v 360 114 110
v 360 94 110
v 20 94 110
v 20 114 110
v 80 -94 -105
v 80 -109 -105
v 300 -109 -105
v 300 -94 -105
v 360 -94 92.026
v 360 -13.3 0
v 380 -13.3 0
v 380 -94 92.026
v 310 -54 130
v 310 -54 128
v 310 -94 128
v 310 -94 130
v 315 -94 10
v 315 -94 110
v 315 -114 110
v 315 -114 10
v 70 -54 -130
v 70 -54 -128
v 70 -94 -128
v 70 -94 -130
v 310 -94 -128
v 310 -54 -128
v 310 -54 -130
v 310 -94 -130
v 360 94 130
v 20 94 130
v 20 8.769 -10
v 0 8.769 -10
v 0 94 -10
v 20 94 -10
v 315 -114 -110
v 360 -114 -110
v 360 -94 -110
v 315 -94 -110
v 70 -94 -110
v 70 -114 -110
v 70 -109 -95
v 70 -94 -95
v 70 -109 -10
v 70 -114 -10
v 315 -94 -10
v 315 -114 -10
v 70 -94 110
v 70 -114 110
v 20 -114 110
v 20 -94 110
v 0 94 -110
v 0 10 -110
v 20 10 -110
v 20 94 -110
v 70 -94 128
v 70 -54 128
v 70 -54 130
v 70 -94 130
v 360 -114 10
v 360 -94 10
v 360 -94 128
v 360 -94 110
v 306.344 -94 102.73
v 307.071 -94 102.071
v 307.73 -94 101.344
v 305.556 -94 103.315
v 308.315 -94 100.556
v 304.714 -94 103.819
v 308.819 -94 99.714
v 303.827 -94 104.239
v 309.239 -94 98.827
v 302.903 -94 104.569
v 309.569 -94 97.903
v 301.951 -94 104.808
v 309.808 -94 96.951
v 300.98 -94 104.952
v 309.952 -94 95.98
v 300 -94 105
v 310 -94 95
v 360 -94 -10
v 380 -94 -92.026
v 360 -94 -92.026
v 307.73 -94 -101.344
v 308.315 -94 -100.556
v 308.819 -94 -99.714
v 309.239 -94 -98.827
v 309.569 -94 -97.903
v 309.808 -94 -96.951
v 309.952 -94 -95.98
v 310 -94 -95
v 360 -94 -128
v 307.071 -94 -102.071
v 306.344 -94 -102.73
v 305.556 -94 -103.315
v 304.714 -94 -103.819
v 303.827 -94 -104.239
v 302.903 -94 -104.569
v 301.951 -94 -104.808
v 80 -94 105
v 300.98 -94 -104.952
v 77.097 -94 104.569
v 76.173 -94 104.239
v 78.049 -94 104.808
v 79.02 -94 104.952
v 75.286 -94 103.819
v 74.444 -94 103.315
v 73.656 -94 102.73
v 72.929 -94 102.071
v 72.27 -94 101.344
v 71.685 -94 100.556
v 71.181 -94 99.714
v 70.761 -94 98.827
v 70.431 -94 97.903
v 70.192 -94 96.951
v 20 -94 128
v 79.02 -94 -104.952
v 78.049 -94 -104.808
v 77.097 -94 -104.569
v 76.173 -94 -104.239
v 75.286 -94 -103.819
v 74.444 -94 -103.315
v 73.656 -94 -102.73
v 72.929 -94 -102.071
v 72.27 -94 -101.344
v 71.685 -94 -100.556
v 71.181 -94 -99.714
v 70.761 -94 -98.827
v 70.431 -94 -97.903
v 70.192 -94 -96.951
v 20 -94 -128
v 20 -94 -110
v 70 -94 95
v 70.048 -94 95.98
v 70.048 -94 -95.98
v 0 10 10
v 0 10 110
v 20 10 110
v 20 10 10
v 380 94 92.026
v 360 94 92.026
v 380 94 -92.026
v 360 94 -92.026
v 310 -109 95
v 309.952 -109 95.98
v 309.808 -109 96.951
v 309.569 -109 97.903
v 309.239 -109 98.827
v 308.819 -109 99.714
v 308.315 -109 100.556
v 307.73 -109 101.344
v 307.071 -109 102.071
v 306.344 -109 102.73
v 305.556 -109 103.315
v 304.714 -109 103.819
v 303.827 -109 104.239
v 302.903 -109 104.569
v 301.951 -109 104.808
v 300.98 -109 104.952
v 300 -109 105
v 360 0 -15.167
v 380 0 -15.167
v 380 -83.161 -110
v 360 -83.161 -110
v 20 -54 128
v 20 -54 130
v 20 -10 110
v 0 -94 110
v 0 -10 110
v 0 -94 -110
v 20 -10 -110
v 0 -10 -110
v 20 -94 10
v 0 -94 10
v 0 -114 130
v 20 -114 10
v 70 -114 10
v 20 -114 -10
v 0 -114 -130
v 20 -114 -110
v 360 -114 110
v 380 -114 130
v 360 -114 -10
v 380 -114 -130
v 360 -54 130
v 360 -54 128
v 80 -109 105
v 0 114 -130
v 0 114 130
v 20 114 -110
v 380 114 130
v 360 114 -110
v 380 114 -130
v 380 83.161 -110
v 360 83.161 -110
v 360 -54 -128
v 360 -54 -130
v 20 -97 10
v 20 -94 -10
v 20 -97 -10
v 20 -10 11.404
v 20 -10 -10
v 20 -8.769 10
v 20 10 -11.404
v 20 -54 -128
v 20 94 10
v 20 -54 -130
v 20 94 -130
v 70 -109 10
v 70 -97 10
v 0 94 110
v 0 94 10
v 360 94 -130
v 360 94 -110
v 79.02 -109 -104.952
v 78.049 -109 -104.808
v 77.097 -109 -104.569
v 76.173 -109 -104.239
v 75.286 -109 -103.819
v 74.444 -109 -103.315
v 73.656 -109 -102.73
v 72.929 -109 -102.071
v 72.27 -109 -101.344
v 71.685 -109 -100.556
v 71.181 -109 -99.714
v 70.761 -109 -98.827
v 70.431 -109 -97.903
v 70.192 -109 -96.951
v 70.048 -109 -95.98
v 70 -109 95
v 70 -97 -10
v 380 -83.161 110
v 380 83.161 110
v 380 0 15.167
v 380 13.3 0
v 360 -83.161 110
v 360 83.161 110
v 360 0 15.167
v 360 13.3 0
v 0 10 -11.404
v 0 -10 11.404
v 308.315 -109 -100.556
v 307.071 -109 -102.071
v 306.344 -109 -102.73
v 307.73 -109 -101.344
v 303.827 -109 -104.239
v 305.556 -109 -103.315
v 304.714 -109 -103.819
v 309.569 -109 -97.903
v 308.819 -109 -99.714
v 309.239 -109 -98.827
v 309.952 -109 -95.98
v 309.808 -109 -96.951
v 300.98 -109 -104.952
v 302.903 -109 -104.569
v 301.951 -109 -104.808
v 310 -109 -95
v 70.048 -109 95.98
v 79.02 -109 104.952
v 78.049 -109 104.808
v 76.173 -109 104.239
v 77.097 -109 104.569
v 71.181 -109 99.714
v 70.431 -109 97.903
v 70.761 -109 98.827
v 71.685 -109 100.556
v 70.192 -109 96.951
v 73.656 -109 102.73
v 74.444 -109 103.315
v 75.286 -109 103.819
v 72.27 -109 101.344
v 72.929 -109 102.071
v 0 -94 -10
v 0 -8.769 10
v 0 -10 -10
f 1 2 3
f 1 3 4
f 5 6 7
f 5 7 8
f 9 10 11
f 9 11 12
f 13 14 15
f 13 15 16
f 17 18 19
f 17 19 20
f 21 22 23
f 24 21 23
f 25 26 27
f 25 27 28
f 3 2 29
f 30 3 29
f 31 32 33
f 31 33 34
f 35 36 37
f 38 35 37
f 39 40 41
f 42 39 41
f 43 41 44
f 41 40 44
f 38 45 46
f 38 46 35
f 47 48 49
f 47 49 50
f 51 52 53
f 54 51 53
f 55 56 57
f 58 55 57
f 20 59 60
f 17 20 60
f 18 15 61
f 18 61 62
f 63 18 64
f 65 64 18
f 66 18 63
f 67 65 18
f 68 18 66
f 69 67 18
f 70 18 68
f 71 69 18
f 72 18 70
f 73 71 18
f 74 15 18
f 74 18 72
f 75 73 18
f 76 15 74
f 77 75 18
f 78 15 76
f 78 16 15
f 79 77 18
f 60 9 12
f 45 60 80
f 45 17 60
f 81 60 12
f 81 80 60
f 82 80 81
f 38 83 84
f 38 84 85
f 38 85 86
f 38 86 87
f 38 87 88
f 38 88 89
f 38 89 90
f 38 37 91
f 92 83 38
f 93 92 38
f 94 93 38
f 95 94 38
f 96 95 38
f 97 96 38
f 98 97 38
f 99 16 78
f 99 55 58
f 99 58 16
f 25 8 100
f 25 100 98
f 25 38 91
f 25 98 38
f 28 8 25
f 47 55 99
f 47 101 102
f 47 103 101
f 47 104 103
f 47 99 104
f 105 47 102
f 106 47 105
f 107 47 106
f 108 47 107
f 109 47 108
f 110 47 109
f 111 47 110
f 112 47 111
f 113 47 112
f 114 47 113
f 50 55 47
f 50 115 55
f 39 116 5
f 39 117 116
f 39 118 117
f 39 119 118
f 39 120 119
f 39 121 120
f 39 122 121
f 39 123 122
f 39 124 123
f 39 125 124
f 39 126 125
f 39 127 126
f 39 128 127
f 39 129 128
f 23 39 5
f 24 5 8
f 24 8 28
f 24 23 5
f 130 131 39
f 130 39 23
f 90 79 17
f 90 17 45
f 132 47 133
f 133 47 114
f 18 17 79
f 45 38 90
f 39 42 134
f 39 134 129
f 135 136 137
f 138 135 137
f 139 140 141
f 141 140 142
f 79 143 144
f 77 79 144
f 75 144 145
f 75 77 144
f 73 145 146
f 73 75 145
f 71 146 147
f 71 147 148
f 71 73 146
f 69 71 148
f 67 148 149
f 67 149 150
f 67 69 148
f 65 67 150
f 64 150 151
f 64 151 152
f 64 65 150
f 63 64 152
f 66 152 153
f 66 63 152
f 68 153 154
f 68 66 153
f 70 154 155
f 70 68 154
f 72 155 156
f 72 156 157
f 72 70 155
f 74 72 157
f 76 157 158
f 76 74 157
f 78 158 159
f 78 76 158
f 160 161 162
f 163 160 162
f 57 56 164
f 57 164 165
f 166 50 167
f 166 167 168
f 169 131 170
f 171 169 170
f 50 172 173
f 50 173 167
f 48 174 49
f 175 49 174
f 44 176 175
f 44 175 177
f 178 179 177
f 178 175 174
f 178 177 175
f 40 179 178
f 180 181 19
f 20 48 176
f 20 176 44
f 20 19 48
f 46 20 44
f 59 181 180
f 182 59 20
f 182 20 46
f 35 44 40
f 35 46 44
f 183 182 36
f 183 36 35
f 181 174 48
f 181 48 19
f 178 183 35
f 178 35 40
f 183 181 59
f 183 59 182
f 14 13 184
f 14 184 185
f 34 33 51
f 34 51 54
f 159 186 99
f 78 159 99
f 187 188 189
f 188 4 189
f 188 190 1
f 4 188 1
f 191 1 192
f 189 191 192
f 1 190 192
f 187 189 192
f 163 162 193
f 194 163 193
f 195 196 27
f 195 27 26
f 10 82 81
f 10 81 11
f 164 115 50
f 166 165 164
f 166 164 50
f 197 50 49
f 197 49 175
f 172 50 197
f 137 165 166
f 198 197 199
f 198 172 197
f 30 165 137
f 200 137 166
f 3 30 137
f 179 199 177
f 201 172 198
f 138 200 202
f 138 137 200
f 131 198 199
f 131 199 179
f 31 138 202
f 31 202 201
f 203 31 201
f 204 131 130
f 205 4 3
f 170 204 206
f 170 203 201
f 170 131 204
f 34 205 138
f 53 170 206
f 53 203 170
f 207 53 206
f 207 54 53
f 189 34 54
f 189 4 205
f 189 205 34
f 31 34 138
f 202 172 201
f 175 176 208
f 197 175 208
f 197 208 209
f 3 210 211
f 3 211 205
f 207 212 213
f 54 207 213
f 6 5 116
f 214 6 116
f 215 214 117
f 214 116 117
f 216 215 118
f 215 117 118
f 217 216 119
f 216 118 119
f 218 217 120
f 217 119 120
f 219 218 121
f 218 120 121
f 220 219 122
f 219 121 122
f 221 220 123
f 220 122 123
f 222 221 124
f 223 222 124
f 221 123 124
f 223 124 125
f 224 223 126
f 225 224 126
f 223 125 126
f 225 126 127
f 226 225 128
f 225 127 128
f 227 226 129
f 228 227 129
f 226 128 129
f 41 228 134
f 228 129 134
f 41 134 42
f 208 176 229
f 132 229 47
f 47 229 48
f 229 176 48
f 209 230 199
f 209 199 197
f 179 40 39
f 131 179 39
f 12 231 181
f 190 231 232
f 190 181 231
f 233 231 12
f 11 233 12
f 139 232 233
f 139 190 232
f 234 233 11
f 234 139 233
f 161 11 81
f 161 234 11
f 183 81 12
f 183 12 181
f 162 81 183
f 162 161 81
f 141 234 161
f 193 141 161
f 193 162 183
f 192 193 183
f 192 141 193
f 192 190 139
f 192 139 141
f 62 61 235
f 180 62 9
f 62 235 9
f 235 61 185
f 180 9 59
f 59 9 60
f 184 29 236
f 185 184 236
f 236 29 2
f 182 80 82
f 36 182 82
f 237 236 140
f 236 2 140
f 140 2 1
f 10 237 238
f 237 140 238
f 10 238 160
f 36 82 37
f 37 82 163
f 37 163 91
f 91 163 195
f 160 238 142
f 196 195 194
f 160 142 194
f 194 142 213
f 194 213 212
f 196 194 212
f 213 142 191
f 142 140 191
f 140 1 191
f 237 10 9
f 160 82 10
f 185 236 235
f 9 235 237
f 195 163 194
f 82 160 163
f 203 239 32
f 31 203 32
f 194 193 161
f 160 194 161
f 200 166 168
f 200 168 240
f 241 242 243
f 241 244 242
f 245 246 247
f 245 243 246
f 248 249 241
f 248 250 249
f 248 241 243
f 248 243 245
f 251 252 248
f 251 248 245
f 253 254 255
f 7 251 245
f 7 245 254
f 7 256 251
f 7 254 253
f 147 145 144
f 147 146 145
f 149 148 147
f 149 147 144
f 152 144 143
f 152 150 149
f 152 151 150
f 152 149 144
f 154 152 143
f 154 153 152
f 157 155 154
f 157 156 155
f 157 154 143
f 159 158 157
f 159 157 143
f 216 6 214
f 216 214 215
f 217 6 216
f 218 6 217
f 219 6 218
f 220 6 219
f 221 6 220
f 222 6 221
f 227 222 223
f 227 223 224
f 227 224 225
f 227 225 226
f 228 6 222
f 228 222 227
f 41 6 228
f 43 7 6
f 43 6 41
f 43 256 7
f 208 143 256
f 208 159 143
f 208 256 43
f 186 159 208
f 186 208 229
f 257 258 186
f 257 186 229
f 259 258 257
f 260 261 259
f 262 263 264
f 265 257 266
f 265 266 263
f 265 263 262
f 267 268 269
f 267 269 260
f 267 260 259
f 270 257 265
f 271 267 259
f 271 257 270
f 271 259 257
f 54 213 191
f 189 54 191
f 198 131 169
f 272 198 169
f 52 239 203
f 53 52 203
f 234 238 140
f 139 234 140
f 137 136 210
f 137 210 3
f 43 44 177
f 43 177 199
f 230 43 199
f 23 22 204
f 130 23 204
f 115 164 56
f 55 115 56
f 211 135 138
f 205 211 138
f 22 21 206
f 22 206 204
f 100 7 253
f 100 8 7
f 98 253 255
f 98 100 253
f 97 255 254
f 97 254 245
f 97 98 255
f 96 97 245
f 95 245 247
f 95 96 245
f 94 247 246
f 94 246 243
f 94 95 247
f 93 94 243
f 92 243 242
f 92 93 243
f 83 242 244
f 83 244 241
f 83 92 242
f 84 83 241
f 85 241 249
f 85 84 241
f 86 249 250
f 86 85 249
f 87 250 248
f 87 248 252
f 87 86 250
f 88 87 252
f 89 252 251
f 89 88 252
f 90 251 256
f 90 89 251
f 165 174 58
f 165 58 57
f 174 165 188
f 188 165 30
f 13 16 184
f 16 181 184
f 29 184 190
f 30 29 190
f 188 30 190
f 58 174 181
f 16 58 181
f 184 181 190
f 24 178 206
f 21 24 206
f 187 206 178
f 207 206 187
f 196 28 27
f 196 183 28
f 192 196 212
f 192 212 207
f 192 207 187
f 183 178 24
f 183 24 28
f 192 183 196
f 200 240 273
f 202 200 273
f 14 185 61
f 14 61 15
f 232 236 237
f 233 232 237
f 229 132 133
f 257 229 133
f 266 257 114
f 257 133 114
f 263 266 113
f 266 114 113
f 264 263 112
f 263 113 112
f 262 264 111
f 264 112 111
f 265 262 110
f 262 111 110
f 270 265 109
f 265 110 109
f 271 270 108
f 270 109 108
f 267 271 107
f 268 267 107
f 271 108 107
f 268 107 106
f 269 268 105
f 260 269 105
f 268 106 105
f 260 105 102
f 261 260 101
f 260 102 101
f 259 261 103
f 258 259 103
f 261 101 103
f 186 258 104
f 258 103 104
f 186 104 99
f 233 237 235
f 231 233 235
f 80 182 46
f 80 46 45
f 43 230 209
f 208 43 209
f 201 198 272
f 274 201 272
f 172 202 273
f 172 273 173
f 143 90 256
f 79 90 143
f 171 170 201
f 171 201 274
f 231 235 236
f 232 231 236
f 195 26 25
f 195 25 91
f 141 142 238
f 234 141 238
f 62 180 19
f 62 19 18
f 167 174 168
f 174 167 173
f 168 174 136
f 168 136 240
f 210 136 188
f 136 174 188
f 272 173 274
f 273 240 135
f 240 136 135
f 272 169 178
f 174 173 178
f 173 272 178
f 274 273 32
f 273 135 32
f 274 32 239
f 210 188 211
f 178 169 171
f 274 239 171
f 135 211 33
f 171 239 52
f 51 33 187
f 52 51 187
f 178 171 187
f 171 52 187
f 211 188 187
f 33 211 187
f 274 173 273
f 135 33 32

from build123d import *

# Parameters (mm, degrees)
SKETCH1_W            = 20
SKETCH1_H            = 260
BOSS_EXTRUDE1_DEPTH  = 10
CUT_EXTRUDE1_DEPTH   = 15
SKETCH3_W            = 10
SKETCH3_H            = 20
BOSS_EXTRUDE2_DEPTH  = 40
BOSS_EXTRUDE3_DEPTH  = 230
BOSS_EXTRUDE4_DEPTH  = 50
SKETCH6_W            = 260
SKETCH6_H            = 228
BOSS_EXTRUDE5_DEPTH  = 20
SKETCH7_W            = 20
SKETCH7_H            = 17
BOSS_EXTRUDE6_DEPTH  = 50
SKETCH8_W            = 20
SKETCH8_H            = 60
BOSS_EXTRUDE7_DEPTH  = 50
SKETCH9_W            = 20
SKETCH9_H            = 60
BOSS_EXTRUDE8_DEPTH  = 50
SKETCH10_W           = 20
SKETCH10_H           = 20
BOSS_EXTRUDE9_DEPTH  = 340
SKETCH11_W           = 20
SKETCH11_H           = 20
BOSS_EXTRUDE10_DEPTH = 340
SKETCH12_W           = 260
SKETCH12_H           = 228
BOSS_EXTRUDE11_DEPTH = 20
SKETCH13_W           = 40
SKETCH13_H           = 20
CUT_EXTRUDE2_DEPTH   = 240
SKETCH14_W           = 210
SKETCH14_H           = 15
CUT_EXTRUDE3_DEPTH   = 230
SKETCH15_W           = 100
SKETCH15_H           = 20
CUT_EXTRUDE4_DEPTH   = 45
SKETCH16_W           = 20
SKETCH16_H           = 100
CUT_EXTRUDE5_DEPTH   = 84
SKETCH17_W           = 20
SKETCH17_H           = 100
CUT_EXTRUDE6_DEPTH   = 84
SKETCH18_W           = 20
SKETCH18_H           = 84
CUT_EXTRUDE7_DEPTH   = 100
SKETCH19_W           = 100
SKETCH19_H           = 20
CUT_EXTRUDE8_DEPTH   = 45
CUT_EXTRUDE9_REACH   = 475.244
SKETCH20_W           = 50
SKETCH20_H           = 40
SKETCH21_W           = 50
SKETCH21_H           = 40
CUT_EXTRUDE10_DEPTH  = 18
CUT_EXTRUDE11_REACH  = 475.244
SKETCH22_W           = 50
SKETCH22_H           = 40
SKETCH23_W           = 50
SKETCH23_H           = 40
CUT_EXTRUDE12_DEPTH  = 18
CUT_EXTRUDE13_DEPTH  = 400.369503092
CUT_EXTRUDE14_DEPTH  = 400.369503092
CUT_EXTRUDE15_REACH  = 419.488
FILLET1_R            = 10


with BuildPart() as part:
    # Sketch1 → Boss-Extrude1 (new body)
    with BuildSketch(Plane(origin=(70, 0, 0), x_dir=(0, -1, 0), z_dir=(-1, 0, 0))):
        with Locations((104, 0)):
            Rectangle(SKETCH1_W, SKETCH1_H)
    extrude(amount=-BOSS_EXTRUDE1_DEPTH)

    # Sketch2 → Cut-Extrude1 (cut)
    with BuildSketch(Plane(origin=(0, -94, 0), x_dir=(-1, 0, 0), z_dir=(0, 1, 0))):
        with BuildLine():
            Line((-80, 105), (-80, -105))
            ThreePointArc((-80, -105), (-72.928932188, -102.071067812), (-70, -95))
            Line((-70, -95), (-70, 95))
            ThreePointArc((-70, 95), (-72.928932188, 102.071067812), (-80, 105))
        make_face()
    extrude(amount=-CUT_EXTRUDE1_DEPTH, mode=Mode.SUBTRACT)

    # Sketch3 → Boss-Extrude2 (add)
    with BuildSketch(Plane(origin=(0, -94, 0), x_dir=(-1, 0, 0), z_dir=(0, 1, 0))):
        with Locations((-75, -120)):
            Rectangle(SKETCH3_W, SKETCH3_H)
    extrude(amount=BOSS_EXTRUDE2_DEPTH)

    # Sketch4 → Boss-Extrude3 (add)
    with BuildSketch(Plane(origin=(80, 0, 0), x_dir=(0, 0, -1), z_dir=(1, 0, 0))):
        Polygon((-130, -114), (-130, -94), (110, -94), (110, -54), (130, -54), (130, -114), align=None)
    extrude(amount=BOSS_EXTRUDE3_DEPTH)

    # Sketch5 → Boss-Extrude4 (add)
    with BuildSketch(Plane(origin=(310, 0, 0), x_dir=(0, 0, -1), z_dir=(1, 0, 0))):
        Polygon((110, -94), (110, -54), (130, -54), (130, -114), (-130, -114), (-130, -54), (-110, -54), (-110, -94), align=None)
    extrude(amount=BOSS_EXTRUDE4_DEPTH)

    # Sketch6 → Boss-Extrude5 (add)
    with BuildSketch(Plane(origin=(360, 0, 0), x_dir=(0, 0, -1), z_dir=(1, 0, 0))):
        Rectangle(SKETCH6_W, SKETCH6_H)
        Polygon((92.025912459, -94), (0, -13.30035369), (-92.025912459, -94), align=None, mode=Mode.SUBTRACT)
    extrude(amount=BOSS_EXTRUDE5_DEPTH)

    # Sketch7 → Boss-Extrude6 (add)
    with BuildSketch(Plane.ZY.offset(-70)):
        with Locations((0, -105.5)):
            Rectangle(SKETCH7_W, SKETCH7_H)
    extrude(amount=BOSS_EXTRUDE6_DEPTH)

    # Sketch8 → Boss-Extrude7 (add)
    with BuildSketch(Plane.ZY.offset(-70)):
        with Locations((120, -84)):
            Rectangle(SKETCH8_W, SKETCH8_H)
    extrude(amount=BOSS_EXTRUDE7_DEPTH)

    # Sketch9 → Boss-Extrude8 (add)
    with BuildSketch(Plane.ZY.offset(-70)):
        with Locations((-120, -84)):
            Rectangle(SKETCH9_W, SKETCH9_H)
    extrude(amount=BOSS_EXTRUDE8_DEPTH)

    # Sketch10 → Boss-Extrude9 (add)
    with BuildSketch(Plane.ZY.offset(-360)):
        with Locations((-120, 104)):
            Rectangle(SKETCH10_W, SKETCH10_H)
    extrude(amount=BOSS_EXTRUDE9_DEPTH)

    # Sketch11 → Boss-Extrude10 (add)
    with BuildSketch(Plane.ZY.offset(-360)):
        with Locations((120, 104)):
            Rectangle(SKETCH11_W, SKETCH11_H)
    extrude(amount=BOSS_EXTRUDE10_DEPTH)

    # Sketch12 → Boss-Extrude11 (add)
    with BuildSketch(Plane(origin=(20, 0, 0), x_dir=(0, 0, -1), z_dir=(1, 0, 0))):
        Rectangle(SKETCH12_W, SKETCH12_H)
        Polygon((10, 8.769230769), (10, 10), (11.403508772, 10), align=None, mode=Mode.SUBTRACT)
        Polygon((-10, -94), (-110, -94), (-110, -10), (-11.403508772, -10), (-10, -8.769230769), align=None, mode=Mode.SUBTRACT)
    extrude(amount=-BOSS_EXTRUDE11_DEPTH)

    # Sketch13 → Cut-Extrude2 (cut)
    with BuildSketch(Plane(origin=(70, 0, 0), x_dir=(0, -1, 0), z_dir=(-1, 0, 0))):
        with Locations((74, -120)):
            Rectangle(SKETCH13_W, SKETCH13_H)
    extrude(amount=-CUT_EXTRUDE2_DEPTH, mode=Mode.SUBTRACT)

    # Sketch14 → Cut-Extrude3 (cut)
    with BuildSketch(Plane.ZY.offset(-80)):
        with Locations((0, -101.5)):
            Rectangle(SKETCH14_W, SKETCH14_H)
    extrude(amount=-CUT_EXTRUDE3_DEPTH, mode=Mode.SUBTRACT)

    # Sketch15 → Cut-Extrude4 (cut)
    with BuildSketch(Plane(origin=(360, 0, 0), x_dir=(0, 0, -1), z_dir=(1, 0, 0))):
        with Locations((60, -104)):
            Rectangle(SKETCH15_W, SKETCH15_H)
    extrude(amount=-CUT_EXTRUDE4_DEPTH, mode=Mode.SUBTRACT)

    # Sketch16 → Cut-Extrude5 (cut)
    with BuildSketch(Plane.XZ.offset(-10)):
        with Locations((10, 60)):
            Rectangle(SKETCH16_W, SKETCH16_H)
    extrude(amount=-CUT_EXTRUDE5_DEPTH, mode=Mode.SUBTRACT)

    # Sketch17 → Cut-Extrude6 (cut)
    with BuildSketch(Plane.XZ.offset(-10)):
        with Locations((10, -60)):
            Rectangle(SKETCH17_W, SKETCH17_H)
    extrude(amount=-CUT_EXTRUDE6_DEPTH, mode=Mode.SUBTRACT)

    # Sketch18 → Cut-Extrude7 (cut)
    with BuildSketch(Plane(origin=(0, 0, -110), x_dir=(-1, 0, 0), z_dir=(0, 0, -1))):
        with Locations((-10, -52)):
            Rectangle(SKETCH18_W, SKETCH18_H)
    extrude(amount=-CUT_EXTRUDE7_DEPTH, mode=Mode.SUBTRACT)

    # Sketch19 → Cut-Extrude8 (cut)
    with BuildSketch(Plane(origin=(360, 0, 0), x_dir=(0, 0, -1), z_dir=(1, 0, 0))):
        with Locations((-60, -104)):
            Rectangle(SKETCH19_W, SKETCH19_H)
    extrude(amount=-CUT_EXTRUDE8_DEPTH, mode=Mode.SUBTRACT)

    # Sketch20 → Cut-Extrude9 (cut, up to next)
    with BuildSketch(Plane(origin=(0, 0, -128), x_dir=(-1, 0, 0), z_dir=(0, 0, -1)), mode=Mode.PRIVATE) as cut_extrude9_sk1:
        with Locations((-45, -74)):
            Rectangle(SKETCH20_W, SKETCH20_H)
    cut_extrude9_tool1 = extrude(cut_extrude9_sk1.sketch, amount=-CUT_EXTRUDE9_REACH, mode=Mode.PRIVATE) & part.part
    add(cut_extrude9_tool1.solids().sort_by_distance((45, -74, -128))[0], mode=Mode.SUBTRACT)

    # Sketch21 → Cut-Extrude10 (cut)
    with BuildSketch(Plane.XY.offset(-110)):
        with Locations((335, -74)):
            Rectangle(SKETCH21_W, SKETCH21_H)
    extrude(amount=-CUT_EXTRUDE10_DEPTH, mode=Mode.SUBTRACT)

    # Sketch22 → Cut-Extrude11 (cut, up to next)
    with BuildSketch(Plane.XY.offset(128), mode=Mode.PRIVATE) as cut_extrude11_sk1:
        with Locations((45, -74)):
            Rectangle(SKETCH22_W, SKETCH22_H)
    cut_extrude11_tool1 = extrude(cut_extrude11_sk1.sketch, amount=-CUT_EXTRUDE11_REACH, mode=Mode.PRIVATE) & part.part
    add(cut_extrude11_tool1.solids().sort_by_distance((45, -74, 128))[0], mode=Mode.SUBTRACT)

    # Sketch23 → Cut-Extrude12 (cut)
    with BuildSketch(Plane(origin=(0, 0, 110), x_dir=(-1, 0, 0), z_dir=(0, 0, -1))):
        with Locations((-335, -74)):
            Rectangle(SKETCH23_W, SKETCH23_H)
    extrude(amount=-CUT_EXTRUDE12_DEPTH, mode=Mode.SUBTRACT)

    # Sketch24 → Cut-Extrude13 (cut, through all)
    with BuildSketch(Plane.ZY.offset(-360)):
        Polygon((-92.025912459, 94), (0, 13.30035369), (92.025912459, 94), align=None)
    extrude(amount=-CUT_EXTRUDE13_DEPTH, mode=Mode.SUBTRACT)

    # Sketch25 → Cut-Extrude14 (cut, through all)
    with BuildSketch(Plane.ZY.offset(-360)):
        Polygon((110, 83.161184771), (15.167069998, 0), (110, -83.161184771), align=None)
    extrude(amount=-CUT_EXTRUDE14_DEPTH, mode=Mode.SUBTRACT)

    # Sketch26 → Cut-Extrude15 (cut, up to next)
    with BuildSketch(Plane(origin=(380, 0, 0), x_dir=(0, 0, -1), z_dir=(1, 0, 0)), mode=Mode.PRIVATE) as cut_extrude15_sk1:
        Polygon((15.167069998, 0), (110, -83.161184771), (110, 83.161184771), align=None)
    cut_extrude15_tool1 = extrude(cut_extrude15_sk1.sketch, amount=-CUT_EXTRUDE15_REACH, mode=Mode.PRIVATE) & part.part
    add(cut_extrude15_tool1.solids().sort_by_distance((380, 0, -78.389023))[0], mode=Mode.SUBTRACT)

    # Fillet1
    fillet1_edges = [part.edges().sort_by_distance(p)[0] for p in [
        (310, -101.5, -105),
        (310, -101.5, 105),
    ]]
    fillet(fillet1_edges, radius=FILLET1_R)


solid = part.part
